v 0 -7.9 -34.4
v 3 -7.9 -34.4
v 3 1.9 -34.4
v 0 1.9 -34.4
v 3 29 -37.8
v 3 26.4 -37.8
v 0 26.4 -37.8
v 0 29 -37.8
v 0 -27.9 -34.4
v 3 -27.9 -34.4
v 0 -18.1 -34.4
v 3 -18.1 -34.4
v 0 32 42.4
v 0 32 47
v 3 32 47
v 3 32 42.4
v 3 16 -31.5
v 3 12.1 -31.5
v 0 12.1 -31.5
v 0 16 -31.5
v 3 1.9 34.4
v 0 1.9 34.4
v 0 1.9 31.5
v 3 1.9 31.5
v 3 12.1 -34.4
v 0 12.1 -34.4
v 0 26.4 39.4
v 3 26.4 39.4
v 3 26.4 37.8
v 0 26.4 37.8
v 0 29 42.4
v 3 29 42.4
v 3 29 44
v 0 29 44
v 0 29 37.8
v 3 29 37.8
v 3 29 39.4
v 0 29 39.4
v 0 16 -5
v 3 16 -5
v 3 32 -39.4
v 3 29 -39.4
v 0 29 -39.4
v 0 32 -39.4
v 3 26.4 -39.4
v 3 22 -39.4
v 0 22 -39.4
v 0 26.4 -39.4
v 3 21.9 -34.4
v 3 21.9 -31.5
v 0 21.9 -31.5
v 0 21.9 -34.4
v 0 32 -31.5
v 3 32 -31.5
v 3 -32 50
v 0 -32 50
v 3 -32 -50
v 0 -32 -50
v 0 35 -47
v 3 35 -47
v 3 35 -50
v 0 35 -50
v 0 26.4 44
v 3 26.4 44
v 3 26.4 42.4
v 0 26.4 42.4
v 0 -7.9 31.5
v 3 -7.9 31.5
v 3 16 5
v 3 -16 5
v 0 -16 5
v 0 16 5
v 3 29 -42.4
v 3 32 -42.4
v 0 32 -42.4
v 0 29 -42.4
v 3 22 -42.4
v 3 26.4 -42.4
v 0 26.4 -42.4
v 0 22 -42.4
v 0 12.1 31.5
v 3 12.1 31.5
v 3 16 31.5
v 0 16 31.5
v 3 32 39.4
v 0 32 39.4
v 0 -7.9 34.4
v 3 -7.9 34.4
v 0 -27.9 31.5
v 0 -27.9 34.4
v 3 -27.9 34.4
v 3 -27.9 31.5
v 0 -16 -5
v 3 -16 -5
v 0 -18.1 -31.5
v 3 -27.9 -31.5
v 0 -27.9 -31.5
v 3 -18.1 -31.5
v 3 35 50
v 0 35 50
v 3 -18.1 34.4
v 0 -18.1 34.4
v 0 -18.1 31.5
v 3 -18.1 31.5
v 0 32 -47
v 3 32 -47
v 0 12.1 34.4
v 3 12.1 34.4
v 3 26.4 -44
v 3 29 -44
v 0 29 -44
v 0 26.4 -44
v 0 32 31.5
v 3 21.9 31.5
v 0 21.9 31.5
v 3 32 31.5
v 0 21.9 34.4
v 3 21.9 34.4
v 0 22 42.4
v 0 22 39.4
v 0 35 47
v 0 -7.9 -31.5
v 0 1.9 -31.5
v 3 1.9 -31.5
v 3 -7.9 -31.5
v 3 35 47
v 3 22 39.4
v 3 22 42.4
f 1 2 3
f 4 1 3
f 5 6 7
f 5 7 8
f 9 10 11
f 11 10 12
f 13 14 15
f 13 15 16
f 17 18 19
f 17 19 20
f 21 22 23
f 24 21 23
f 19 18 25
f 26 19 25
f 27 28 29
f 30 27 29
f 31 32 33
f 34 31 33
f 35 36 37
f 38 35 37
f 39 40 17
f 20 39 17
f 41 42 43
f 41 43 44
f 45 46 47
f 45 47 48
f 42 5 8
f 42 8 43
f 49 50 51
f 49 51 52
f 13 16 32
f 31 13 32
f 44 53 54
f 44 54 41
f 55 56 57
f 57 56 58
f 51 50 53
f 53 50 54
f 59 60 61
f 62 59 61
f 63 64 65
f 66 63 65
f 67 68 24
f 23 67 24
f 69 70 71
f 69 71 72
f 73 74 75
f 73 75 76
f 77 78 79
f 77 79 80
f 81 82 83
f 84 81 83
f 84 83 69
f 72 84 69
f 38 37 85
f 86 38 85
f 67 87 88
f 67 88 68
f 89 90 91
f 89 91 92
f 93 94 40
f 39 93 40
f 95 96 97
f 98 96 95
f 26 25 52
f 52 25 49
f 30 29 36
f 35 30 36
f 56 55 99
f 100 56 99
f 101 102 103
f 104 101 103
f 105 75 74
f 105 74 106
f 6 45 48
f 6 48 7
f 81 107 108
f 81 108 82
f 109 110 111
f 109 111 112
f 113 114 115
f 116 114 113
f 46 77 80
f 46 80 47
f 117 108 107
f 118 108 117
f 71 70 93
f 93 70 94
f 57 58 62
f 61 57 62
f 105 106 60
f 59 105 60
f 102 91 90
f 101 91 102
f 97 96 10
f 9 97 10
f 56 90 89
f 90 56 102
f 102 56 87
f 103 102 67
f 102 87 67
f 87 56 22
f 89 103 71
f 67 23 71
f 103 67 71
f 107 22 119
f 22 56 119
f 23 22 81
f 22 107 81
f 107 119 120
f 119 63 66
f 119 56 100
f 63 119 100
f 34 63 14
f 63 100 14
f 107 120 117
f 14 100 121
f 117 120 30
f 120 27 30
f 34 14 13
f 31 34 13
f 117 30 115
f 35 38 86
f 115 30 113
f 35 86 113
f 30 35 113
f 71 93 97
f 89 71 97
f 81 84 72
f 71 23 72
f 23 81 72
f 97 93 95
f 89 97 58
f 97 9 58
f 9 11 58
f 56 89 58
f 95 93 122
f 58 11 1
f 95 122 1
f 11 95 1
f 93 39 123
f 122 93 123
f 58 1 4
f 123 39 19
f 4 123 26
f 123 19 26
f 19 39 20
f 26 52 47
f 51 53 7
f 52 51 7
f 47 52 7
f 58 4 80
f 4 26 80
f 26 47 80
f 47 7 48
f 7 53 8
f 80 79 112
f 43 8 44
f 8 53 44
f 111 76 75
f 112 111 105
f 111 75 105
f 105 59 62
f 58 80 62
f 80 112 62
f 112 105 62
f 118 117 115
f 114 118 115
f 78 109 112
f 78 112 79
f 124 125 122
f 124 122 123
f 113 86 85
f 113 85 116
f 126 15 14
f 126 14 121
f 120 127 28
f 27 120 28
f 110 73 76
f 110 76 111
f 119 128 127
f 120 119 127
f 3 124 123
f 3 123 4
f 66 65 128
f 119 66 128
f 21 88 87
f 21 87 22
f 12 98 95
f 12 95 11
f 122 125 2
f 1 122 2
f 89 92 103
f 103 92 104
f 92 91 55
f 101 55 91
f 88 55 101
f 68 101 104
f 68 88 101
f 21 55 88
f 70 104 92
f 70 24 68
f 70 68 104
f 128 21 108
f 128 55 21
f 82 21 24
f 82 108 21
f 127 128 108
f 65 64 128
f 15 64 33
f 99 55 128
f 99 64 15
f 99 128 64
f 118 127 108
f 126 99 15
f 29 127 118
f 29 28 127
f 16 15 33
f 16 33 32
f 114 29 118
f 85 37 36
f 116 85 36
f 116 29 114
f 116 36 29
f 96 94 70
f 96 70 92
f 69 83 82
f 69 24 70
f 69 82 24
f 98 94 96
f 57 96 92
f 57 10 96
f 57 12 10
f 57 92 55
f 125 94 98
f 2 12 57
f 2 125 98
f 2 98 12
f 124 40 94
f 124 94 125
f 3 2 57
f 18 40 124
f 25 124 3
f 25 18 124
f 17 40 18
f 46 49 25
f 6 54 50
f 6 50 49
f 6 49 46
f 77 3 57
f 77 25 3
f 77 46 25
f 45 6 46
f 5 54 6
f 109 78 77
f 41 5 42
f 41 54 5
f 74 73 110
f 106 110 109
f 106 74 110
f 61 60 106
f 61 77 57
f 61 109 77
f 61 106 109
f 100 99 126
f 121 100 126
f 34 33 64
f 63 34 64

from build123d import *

# Parameters (mm, degrees)
SKETCH1_W           = 100
SKETCH1_H           = 64
BOSS_EXTRUDE1_DEPTH = 3
SKETCH2_W           = 2.9
SKETCH2_H           = 9.8
CUT_EXTRUDE1_DEPTH  = 3
CUT_EXTRUDE2_DEPTH  = 10
SKETCH5_W           = 63
SKETCH5_H           = 16
CUT_EXTRUDE3_DEPTH  = 10
SKETCH6_W           = 10
SKETCH6_H           = 32
CUT_EXTRUDE4_DEPTH  = 10
SKETCH7_W           = 3
SKETCH7_H           = 3
BOSS_EXTRUDE2_DEPTH = 3


with BuildPart() as part:
    # Sketch1 → Boss-Extrude1 (new body)
    with BuildSketch(Plane(origin=(0, 0, 0), x_dir=(0, 0, -1), z_dir=(1, 0, 0))):
        Rectangle(SKETCH1_W, SKETCH1_H)
    extrude(amount=BOSS_EXTRUDE1_DEPTH)

    # Sketch2 → Cut-Extrude1 (cut)
    with BuildSketch(Plane(origin=(3, 0, 0), x_dir=(0, 0, -1), z_dir=(1, 0, 0))):
        with Locations((-32.95, 17)):
            Rectangle(SKETCH2_W, SKETCH2_H)
        with Locations((-32.95, -3)):
            Rectangle(SKETCH2_W, SKETCH2_H)
        with Locations((-32.95, -23)):
            Rectangle(SKETCH2_W, SKETCH2_H)
        with Locations((32.95, -23)):
            Rectangle(SKETCH2_W, SKETCH2_H)
        with Locations((32.95, -3)):
            Rectangle(SKETCH2_W, SKETCH2_H)
        with Locations((32.95, 17)):
            Rectangle(SKETCH2_W, SKETCH2_H)
    extrude(amount=-CUT_EXTRUDE1_DEPTH, mode=Mode.SUBTRACT)

    # Sketch3 → Cut-Extrude2 (cut)
    with BuildSketch(Plane(origin=(3, 0, 0), x_dir=(0, 0, -1), z_dir=(1, 0, 0))):
        Polygon((-42.4, 32), (-42.4, 29), (-44, 29), (-44, 26.4), (-42.4, 26.4), (-42.4, 22), (-39.4, 22), (-39.4, 26.4), (-37.8, 26.4), (-37.8, 29), (-39.4, 29), (-39.4, 32), align=None)
    cut_extrude2 = extrude(amount=-CUT_EXTRUDE2_DEPTH, mode=Mode.SUBTRACT)

    # Mirror1: Cut-Extrude2 across plane
    add(cut_extrude2.mirror(Plane.XY), mode=Mode.SUBTRACT)

    # Sketch5 → Cut-Extrude3 (cut)
    with BuildSketch(Plane(origin=(3, 0, 0), x_dir=(0, 0, -1), z_dir=(1, 0, 0))):
        with Locations((0, 24)):
            Rectangle(SKETCH5_W, SKETCH5_H)
    extrude(amount=-CUT_EXTRUDE3_DEPTH, mode=Mode.SUBTRACT)

    # Sketch6 → Cut-Extrude4 (cut)
    with BuildSketch(Plane(origin=(3, 0, 0), x_dir=(0, 0, -1), z_dir=(1, 0, 0))):
        Rectangle(SKETCH6_W, SKETCH6_H)
    extrude(amount=-CUT_EXTRUDE4_DEPTH, mode=Mode.SUBTRACT)

    # Sketch7 → Boss-Extrude2 (add)
    with BuildSketch(Plane(origin=(3, 0, 0), x_dir=(0, 0, -1), z_dir=(1, 0, 0))):
        with Locations((-48.5, 33.5)):
            Rectangle(SKETCH7_W, SKETCH7_H)
        with Locations((48.5, 33.5)):
            Rectangle(SKETCH7_W, SKETCH7_H)
    extrude(amount=-BOSS_EXTRUDE2_DEPTH)


solid = part.part
